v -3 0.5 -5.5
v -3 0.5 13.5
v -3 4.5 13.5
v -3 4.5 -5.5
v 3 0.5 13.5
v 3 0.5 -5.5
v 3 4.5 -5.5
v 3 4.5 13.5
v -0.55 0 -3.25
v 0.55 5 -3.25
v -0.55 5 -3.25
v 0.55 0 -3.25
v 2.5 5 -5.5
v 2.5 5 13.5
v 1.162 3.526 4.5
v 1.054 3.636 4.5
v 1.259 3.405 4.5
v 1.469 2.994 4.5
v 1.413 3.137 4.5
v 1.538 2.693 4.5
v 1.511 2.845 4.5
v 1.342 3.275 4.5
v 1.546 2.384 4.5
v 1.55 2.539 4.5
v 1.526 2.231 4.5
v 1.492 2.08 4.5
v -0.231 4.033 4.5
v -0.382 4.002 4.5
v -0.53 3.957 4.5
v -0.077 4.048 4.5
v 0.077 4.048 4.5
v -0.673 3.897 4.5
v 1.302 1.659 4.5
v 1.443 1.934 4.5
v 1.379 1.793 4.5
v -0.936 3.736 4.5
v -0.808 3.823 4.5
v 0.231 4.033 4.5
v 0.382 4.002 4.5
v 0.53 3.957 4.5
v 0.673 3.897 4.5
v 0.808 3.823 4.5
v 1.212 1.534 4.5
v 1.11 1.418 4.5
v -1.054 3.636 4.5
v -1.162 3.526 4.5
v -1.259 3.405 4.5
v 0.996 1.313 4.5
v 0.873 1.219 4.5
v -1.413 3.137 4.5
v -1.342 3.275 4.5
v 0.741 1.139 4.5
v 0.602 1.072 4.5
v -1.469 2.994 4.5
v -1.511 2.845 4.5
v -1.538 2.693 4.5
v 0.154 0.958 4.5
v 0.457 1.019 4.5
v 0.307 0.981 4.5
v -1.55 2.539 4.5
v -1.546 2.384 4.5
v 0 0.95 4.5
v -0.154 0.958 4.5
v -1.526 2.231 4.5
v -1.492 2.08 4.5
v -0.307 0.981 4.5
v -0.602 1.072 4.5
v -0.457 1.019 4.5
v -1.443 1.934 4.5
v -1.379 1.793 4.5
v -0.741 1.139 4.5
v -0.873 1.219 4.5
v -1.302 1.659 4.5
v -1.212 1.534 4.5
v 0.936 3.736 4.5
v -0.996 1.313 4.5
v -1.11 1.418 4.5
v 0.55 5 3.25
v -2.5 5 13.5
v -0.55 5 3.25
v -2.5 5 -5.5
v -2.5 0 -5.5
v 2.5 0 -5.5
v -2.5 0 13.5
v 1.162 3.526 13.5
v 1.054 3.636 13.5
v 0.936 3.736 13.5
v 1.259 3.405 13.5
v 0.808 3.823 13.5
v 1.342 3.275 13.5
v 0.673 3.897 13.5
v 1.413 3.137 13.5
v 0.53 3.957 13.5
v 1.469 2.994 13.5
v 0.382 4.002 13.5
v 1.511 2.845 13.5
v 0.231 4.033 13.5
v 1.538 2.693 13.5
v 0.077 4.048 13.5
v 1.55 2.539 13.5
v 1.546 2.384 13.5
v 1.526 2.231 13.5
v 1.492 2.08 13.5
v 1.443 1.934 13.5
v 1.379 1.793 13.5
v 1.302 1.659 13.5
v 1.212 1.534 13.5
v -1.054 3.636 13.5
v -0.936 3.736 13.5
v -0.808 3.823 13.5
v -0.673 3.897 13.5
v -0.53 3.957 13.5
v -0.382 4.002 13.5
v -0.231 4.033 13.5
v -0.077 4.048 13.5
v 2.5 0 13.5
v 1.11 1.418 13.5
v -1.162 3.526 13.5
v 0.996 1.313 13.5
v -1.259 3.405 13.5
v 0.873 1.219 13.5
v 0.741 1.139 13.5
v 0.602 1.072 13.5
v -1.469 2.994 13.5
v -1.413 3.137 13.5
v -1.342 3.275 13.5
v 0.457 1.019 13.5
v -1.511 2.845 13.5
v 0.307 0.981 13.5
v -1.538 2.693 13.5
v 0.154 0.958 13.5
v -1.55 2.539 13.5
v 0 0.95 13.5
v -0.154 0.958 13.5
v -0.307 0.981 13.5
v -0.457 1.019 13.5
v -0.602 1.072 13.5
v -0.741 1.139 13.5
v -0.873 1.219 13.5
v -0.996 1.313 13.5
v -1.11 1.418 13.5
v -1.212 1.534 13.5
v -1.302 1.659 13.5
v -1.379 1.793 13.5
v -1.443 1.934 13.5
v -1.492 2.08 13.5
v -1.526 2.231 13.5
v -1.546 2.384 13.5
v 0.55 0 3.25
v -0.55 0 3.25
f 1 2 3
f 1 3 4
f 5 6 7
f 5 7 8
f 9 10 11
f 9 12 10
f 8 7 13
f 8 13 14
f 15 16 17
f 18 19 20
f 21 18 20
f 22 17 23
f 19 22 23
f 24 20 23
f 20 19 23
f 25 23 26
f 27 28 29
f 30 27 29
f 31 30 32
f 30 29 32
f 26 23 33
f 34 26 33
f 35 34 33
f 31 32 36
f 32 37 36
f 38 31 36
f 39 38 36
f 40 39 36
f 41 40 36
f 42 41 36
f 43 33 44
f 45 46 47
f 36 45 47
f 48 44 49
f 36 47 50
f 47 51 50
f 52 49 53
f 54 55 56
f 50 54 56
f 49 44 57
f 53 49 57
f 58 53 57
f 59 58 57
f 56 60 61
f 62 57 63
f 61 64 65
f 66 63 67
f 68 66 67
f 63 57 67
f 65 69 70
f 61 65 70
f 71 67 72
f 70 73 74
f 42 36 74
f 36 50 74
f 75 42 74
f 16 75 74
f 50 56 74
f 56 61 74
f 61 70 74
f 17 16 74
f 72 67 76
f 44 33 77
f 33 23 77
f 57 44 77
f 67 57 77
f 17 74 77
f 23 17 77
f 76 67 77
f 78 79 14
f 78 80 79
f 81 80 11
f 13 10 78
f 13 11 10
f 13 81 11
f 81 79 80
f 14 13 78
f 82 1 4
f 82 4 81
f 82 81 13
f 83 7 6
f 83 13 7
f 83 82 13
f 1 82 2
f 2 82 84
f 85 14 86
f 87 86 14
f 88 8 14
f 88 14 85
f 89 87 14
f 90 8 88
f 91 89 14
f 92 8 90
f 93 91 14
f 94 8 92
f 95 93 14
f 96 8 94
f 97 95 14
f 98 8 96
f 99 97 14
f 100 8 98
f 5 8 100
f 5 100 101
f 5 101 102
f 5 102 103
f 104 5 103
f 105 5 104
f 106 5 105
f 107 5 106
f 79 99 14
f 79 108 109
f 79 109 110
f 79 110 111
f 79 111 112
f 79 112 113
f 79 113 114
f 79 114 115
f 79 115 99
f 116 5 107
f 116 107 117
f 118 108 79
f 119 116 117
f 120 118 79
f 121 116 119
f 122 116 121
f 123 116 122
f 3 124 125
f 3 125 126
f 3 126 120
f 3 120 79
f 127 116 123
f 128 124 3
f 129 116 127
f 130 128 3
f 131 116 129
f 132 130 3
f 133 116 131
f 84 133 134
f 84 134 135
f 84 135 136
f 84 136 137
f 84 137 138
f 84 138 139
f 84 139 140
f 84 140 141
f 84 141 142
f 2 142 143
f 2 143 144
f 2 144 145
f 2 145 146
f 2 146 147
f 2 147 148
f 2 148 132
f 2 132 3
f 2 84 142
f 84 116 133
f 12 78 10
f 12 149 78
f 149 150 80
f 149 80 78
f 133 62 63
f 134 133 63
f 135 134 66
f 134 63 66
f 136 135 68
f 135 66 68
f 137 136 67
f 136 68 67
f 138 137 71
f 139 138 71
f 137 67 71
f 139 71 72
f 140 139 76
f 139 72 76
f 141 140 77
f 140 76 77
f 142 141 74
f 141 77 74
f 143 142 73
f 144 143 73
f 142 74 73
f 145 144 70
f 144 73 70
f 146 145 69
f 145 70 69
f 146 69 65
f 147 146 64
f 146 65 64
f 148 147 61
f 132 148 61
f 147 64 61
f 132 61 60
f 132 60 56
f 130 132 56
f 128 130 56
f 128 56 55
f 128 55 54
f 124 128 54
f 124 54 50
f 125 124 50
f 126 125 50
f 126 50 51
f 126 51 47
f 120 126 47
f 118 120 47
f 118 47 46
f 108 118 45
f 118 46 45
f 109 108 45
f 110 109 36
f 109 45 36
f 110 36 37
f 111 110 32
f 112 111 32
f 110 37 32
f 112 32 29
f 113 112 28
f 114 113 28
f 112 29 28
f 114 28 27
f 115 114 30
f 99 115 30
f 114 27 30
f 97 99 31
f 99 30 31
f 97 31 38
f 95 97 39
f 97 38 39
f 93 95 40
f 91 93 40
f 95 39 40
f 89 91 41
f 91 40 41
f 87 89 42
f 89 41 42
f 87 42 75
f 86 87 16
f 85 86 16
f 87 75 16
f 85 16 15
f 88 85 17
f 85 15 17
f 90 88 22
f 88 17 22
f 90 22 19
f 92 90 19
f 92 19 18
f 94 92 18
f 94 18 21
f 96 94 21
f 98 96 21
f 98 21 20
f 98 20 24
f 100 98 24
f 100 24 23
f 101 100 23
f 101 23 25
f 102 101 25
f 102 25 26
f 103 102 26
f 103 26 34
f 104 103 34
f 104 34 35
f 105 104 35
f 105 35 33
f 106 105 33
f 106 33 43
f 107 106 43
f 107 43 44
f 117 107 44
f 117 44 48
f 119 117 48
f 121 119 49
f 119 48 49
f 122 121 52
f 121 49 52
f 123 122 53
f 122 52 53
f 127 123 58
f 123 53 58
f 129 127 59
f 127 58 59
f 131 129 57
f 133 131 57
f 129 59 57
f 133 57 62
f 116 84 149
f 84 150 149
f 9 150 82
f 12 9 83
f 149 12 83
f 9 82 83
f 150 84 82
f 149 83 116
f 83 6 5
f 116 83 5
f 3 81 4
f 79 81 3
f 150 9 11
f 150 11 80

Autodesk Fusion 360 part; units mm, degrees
sketch "Sketch1" plane through (0, 0, 0) normal (0, 1, 0) x (1, 0, 0)
  line L0 (0.55, 3.25) -> (-0.55, 3.25)
  line L1 (-0.55, 3.25) -> (-0.55, -3.25)
  line L2 (-0.55, -3.25) -> (0.55, -3.25)
  line L3 (0.55, -3.25) -> (0.55, 3.25)
  line L4 (0.55, 3.25) -> (-0.55, -3.25) construction
  line L5 (-0.55, 3.25) -> (0.55, -3.25) construction
  line L6 (3, -5.5) -> (-3, -5.5)
  line L7 (-3, -5.5) -> (-3, 5.5)
  line L8 (-3, 5.5) -> (3, 5.5)
  line L9 (3, 5.5) -> (3, -5.5)
  line L10 (3, -5.5) -> (-3, 5.5) construction
  line L11 (-3, -5.5) -> (3, 5.5) construction
  dimension "d1" = 1.1
  dimension "d2" = 6.5
  dimension "d3" = 6
  dimension "d4" = 11
sketch "Sketch2" plane through (0, 0, 0) normal (0, 1, 0) x (1, 0, 0)
extrude "Extrude1" add sketch "Sketch1" along normal blind 5
extrude "Extrude2" add 1 faces at (1, 1.6667, 5.5) along direction (0, 0, 1) blind 8
hole "Hole1" at (0, 2.5, 13.5) direction (0, 0, -1) diameter 3.1 depth 9 tip angle 180
chamfer "Chamfer1" distance 0.5 angle 45 4 edges at (3, 5, 4) (-3, 5, 4) (3, 0, 4) (-3, 0, 4)
